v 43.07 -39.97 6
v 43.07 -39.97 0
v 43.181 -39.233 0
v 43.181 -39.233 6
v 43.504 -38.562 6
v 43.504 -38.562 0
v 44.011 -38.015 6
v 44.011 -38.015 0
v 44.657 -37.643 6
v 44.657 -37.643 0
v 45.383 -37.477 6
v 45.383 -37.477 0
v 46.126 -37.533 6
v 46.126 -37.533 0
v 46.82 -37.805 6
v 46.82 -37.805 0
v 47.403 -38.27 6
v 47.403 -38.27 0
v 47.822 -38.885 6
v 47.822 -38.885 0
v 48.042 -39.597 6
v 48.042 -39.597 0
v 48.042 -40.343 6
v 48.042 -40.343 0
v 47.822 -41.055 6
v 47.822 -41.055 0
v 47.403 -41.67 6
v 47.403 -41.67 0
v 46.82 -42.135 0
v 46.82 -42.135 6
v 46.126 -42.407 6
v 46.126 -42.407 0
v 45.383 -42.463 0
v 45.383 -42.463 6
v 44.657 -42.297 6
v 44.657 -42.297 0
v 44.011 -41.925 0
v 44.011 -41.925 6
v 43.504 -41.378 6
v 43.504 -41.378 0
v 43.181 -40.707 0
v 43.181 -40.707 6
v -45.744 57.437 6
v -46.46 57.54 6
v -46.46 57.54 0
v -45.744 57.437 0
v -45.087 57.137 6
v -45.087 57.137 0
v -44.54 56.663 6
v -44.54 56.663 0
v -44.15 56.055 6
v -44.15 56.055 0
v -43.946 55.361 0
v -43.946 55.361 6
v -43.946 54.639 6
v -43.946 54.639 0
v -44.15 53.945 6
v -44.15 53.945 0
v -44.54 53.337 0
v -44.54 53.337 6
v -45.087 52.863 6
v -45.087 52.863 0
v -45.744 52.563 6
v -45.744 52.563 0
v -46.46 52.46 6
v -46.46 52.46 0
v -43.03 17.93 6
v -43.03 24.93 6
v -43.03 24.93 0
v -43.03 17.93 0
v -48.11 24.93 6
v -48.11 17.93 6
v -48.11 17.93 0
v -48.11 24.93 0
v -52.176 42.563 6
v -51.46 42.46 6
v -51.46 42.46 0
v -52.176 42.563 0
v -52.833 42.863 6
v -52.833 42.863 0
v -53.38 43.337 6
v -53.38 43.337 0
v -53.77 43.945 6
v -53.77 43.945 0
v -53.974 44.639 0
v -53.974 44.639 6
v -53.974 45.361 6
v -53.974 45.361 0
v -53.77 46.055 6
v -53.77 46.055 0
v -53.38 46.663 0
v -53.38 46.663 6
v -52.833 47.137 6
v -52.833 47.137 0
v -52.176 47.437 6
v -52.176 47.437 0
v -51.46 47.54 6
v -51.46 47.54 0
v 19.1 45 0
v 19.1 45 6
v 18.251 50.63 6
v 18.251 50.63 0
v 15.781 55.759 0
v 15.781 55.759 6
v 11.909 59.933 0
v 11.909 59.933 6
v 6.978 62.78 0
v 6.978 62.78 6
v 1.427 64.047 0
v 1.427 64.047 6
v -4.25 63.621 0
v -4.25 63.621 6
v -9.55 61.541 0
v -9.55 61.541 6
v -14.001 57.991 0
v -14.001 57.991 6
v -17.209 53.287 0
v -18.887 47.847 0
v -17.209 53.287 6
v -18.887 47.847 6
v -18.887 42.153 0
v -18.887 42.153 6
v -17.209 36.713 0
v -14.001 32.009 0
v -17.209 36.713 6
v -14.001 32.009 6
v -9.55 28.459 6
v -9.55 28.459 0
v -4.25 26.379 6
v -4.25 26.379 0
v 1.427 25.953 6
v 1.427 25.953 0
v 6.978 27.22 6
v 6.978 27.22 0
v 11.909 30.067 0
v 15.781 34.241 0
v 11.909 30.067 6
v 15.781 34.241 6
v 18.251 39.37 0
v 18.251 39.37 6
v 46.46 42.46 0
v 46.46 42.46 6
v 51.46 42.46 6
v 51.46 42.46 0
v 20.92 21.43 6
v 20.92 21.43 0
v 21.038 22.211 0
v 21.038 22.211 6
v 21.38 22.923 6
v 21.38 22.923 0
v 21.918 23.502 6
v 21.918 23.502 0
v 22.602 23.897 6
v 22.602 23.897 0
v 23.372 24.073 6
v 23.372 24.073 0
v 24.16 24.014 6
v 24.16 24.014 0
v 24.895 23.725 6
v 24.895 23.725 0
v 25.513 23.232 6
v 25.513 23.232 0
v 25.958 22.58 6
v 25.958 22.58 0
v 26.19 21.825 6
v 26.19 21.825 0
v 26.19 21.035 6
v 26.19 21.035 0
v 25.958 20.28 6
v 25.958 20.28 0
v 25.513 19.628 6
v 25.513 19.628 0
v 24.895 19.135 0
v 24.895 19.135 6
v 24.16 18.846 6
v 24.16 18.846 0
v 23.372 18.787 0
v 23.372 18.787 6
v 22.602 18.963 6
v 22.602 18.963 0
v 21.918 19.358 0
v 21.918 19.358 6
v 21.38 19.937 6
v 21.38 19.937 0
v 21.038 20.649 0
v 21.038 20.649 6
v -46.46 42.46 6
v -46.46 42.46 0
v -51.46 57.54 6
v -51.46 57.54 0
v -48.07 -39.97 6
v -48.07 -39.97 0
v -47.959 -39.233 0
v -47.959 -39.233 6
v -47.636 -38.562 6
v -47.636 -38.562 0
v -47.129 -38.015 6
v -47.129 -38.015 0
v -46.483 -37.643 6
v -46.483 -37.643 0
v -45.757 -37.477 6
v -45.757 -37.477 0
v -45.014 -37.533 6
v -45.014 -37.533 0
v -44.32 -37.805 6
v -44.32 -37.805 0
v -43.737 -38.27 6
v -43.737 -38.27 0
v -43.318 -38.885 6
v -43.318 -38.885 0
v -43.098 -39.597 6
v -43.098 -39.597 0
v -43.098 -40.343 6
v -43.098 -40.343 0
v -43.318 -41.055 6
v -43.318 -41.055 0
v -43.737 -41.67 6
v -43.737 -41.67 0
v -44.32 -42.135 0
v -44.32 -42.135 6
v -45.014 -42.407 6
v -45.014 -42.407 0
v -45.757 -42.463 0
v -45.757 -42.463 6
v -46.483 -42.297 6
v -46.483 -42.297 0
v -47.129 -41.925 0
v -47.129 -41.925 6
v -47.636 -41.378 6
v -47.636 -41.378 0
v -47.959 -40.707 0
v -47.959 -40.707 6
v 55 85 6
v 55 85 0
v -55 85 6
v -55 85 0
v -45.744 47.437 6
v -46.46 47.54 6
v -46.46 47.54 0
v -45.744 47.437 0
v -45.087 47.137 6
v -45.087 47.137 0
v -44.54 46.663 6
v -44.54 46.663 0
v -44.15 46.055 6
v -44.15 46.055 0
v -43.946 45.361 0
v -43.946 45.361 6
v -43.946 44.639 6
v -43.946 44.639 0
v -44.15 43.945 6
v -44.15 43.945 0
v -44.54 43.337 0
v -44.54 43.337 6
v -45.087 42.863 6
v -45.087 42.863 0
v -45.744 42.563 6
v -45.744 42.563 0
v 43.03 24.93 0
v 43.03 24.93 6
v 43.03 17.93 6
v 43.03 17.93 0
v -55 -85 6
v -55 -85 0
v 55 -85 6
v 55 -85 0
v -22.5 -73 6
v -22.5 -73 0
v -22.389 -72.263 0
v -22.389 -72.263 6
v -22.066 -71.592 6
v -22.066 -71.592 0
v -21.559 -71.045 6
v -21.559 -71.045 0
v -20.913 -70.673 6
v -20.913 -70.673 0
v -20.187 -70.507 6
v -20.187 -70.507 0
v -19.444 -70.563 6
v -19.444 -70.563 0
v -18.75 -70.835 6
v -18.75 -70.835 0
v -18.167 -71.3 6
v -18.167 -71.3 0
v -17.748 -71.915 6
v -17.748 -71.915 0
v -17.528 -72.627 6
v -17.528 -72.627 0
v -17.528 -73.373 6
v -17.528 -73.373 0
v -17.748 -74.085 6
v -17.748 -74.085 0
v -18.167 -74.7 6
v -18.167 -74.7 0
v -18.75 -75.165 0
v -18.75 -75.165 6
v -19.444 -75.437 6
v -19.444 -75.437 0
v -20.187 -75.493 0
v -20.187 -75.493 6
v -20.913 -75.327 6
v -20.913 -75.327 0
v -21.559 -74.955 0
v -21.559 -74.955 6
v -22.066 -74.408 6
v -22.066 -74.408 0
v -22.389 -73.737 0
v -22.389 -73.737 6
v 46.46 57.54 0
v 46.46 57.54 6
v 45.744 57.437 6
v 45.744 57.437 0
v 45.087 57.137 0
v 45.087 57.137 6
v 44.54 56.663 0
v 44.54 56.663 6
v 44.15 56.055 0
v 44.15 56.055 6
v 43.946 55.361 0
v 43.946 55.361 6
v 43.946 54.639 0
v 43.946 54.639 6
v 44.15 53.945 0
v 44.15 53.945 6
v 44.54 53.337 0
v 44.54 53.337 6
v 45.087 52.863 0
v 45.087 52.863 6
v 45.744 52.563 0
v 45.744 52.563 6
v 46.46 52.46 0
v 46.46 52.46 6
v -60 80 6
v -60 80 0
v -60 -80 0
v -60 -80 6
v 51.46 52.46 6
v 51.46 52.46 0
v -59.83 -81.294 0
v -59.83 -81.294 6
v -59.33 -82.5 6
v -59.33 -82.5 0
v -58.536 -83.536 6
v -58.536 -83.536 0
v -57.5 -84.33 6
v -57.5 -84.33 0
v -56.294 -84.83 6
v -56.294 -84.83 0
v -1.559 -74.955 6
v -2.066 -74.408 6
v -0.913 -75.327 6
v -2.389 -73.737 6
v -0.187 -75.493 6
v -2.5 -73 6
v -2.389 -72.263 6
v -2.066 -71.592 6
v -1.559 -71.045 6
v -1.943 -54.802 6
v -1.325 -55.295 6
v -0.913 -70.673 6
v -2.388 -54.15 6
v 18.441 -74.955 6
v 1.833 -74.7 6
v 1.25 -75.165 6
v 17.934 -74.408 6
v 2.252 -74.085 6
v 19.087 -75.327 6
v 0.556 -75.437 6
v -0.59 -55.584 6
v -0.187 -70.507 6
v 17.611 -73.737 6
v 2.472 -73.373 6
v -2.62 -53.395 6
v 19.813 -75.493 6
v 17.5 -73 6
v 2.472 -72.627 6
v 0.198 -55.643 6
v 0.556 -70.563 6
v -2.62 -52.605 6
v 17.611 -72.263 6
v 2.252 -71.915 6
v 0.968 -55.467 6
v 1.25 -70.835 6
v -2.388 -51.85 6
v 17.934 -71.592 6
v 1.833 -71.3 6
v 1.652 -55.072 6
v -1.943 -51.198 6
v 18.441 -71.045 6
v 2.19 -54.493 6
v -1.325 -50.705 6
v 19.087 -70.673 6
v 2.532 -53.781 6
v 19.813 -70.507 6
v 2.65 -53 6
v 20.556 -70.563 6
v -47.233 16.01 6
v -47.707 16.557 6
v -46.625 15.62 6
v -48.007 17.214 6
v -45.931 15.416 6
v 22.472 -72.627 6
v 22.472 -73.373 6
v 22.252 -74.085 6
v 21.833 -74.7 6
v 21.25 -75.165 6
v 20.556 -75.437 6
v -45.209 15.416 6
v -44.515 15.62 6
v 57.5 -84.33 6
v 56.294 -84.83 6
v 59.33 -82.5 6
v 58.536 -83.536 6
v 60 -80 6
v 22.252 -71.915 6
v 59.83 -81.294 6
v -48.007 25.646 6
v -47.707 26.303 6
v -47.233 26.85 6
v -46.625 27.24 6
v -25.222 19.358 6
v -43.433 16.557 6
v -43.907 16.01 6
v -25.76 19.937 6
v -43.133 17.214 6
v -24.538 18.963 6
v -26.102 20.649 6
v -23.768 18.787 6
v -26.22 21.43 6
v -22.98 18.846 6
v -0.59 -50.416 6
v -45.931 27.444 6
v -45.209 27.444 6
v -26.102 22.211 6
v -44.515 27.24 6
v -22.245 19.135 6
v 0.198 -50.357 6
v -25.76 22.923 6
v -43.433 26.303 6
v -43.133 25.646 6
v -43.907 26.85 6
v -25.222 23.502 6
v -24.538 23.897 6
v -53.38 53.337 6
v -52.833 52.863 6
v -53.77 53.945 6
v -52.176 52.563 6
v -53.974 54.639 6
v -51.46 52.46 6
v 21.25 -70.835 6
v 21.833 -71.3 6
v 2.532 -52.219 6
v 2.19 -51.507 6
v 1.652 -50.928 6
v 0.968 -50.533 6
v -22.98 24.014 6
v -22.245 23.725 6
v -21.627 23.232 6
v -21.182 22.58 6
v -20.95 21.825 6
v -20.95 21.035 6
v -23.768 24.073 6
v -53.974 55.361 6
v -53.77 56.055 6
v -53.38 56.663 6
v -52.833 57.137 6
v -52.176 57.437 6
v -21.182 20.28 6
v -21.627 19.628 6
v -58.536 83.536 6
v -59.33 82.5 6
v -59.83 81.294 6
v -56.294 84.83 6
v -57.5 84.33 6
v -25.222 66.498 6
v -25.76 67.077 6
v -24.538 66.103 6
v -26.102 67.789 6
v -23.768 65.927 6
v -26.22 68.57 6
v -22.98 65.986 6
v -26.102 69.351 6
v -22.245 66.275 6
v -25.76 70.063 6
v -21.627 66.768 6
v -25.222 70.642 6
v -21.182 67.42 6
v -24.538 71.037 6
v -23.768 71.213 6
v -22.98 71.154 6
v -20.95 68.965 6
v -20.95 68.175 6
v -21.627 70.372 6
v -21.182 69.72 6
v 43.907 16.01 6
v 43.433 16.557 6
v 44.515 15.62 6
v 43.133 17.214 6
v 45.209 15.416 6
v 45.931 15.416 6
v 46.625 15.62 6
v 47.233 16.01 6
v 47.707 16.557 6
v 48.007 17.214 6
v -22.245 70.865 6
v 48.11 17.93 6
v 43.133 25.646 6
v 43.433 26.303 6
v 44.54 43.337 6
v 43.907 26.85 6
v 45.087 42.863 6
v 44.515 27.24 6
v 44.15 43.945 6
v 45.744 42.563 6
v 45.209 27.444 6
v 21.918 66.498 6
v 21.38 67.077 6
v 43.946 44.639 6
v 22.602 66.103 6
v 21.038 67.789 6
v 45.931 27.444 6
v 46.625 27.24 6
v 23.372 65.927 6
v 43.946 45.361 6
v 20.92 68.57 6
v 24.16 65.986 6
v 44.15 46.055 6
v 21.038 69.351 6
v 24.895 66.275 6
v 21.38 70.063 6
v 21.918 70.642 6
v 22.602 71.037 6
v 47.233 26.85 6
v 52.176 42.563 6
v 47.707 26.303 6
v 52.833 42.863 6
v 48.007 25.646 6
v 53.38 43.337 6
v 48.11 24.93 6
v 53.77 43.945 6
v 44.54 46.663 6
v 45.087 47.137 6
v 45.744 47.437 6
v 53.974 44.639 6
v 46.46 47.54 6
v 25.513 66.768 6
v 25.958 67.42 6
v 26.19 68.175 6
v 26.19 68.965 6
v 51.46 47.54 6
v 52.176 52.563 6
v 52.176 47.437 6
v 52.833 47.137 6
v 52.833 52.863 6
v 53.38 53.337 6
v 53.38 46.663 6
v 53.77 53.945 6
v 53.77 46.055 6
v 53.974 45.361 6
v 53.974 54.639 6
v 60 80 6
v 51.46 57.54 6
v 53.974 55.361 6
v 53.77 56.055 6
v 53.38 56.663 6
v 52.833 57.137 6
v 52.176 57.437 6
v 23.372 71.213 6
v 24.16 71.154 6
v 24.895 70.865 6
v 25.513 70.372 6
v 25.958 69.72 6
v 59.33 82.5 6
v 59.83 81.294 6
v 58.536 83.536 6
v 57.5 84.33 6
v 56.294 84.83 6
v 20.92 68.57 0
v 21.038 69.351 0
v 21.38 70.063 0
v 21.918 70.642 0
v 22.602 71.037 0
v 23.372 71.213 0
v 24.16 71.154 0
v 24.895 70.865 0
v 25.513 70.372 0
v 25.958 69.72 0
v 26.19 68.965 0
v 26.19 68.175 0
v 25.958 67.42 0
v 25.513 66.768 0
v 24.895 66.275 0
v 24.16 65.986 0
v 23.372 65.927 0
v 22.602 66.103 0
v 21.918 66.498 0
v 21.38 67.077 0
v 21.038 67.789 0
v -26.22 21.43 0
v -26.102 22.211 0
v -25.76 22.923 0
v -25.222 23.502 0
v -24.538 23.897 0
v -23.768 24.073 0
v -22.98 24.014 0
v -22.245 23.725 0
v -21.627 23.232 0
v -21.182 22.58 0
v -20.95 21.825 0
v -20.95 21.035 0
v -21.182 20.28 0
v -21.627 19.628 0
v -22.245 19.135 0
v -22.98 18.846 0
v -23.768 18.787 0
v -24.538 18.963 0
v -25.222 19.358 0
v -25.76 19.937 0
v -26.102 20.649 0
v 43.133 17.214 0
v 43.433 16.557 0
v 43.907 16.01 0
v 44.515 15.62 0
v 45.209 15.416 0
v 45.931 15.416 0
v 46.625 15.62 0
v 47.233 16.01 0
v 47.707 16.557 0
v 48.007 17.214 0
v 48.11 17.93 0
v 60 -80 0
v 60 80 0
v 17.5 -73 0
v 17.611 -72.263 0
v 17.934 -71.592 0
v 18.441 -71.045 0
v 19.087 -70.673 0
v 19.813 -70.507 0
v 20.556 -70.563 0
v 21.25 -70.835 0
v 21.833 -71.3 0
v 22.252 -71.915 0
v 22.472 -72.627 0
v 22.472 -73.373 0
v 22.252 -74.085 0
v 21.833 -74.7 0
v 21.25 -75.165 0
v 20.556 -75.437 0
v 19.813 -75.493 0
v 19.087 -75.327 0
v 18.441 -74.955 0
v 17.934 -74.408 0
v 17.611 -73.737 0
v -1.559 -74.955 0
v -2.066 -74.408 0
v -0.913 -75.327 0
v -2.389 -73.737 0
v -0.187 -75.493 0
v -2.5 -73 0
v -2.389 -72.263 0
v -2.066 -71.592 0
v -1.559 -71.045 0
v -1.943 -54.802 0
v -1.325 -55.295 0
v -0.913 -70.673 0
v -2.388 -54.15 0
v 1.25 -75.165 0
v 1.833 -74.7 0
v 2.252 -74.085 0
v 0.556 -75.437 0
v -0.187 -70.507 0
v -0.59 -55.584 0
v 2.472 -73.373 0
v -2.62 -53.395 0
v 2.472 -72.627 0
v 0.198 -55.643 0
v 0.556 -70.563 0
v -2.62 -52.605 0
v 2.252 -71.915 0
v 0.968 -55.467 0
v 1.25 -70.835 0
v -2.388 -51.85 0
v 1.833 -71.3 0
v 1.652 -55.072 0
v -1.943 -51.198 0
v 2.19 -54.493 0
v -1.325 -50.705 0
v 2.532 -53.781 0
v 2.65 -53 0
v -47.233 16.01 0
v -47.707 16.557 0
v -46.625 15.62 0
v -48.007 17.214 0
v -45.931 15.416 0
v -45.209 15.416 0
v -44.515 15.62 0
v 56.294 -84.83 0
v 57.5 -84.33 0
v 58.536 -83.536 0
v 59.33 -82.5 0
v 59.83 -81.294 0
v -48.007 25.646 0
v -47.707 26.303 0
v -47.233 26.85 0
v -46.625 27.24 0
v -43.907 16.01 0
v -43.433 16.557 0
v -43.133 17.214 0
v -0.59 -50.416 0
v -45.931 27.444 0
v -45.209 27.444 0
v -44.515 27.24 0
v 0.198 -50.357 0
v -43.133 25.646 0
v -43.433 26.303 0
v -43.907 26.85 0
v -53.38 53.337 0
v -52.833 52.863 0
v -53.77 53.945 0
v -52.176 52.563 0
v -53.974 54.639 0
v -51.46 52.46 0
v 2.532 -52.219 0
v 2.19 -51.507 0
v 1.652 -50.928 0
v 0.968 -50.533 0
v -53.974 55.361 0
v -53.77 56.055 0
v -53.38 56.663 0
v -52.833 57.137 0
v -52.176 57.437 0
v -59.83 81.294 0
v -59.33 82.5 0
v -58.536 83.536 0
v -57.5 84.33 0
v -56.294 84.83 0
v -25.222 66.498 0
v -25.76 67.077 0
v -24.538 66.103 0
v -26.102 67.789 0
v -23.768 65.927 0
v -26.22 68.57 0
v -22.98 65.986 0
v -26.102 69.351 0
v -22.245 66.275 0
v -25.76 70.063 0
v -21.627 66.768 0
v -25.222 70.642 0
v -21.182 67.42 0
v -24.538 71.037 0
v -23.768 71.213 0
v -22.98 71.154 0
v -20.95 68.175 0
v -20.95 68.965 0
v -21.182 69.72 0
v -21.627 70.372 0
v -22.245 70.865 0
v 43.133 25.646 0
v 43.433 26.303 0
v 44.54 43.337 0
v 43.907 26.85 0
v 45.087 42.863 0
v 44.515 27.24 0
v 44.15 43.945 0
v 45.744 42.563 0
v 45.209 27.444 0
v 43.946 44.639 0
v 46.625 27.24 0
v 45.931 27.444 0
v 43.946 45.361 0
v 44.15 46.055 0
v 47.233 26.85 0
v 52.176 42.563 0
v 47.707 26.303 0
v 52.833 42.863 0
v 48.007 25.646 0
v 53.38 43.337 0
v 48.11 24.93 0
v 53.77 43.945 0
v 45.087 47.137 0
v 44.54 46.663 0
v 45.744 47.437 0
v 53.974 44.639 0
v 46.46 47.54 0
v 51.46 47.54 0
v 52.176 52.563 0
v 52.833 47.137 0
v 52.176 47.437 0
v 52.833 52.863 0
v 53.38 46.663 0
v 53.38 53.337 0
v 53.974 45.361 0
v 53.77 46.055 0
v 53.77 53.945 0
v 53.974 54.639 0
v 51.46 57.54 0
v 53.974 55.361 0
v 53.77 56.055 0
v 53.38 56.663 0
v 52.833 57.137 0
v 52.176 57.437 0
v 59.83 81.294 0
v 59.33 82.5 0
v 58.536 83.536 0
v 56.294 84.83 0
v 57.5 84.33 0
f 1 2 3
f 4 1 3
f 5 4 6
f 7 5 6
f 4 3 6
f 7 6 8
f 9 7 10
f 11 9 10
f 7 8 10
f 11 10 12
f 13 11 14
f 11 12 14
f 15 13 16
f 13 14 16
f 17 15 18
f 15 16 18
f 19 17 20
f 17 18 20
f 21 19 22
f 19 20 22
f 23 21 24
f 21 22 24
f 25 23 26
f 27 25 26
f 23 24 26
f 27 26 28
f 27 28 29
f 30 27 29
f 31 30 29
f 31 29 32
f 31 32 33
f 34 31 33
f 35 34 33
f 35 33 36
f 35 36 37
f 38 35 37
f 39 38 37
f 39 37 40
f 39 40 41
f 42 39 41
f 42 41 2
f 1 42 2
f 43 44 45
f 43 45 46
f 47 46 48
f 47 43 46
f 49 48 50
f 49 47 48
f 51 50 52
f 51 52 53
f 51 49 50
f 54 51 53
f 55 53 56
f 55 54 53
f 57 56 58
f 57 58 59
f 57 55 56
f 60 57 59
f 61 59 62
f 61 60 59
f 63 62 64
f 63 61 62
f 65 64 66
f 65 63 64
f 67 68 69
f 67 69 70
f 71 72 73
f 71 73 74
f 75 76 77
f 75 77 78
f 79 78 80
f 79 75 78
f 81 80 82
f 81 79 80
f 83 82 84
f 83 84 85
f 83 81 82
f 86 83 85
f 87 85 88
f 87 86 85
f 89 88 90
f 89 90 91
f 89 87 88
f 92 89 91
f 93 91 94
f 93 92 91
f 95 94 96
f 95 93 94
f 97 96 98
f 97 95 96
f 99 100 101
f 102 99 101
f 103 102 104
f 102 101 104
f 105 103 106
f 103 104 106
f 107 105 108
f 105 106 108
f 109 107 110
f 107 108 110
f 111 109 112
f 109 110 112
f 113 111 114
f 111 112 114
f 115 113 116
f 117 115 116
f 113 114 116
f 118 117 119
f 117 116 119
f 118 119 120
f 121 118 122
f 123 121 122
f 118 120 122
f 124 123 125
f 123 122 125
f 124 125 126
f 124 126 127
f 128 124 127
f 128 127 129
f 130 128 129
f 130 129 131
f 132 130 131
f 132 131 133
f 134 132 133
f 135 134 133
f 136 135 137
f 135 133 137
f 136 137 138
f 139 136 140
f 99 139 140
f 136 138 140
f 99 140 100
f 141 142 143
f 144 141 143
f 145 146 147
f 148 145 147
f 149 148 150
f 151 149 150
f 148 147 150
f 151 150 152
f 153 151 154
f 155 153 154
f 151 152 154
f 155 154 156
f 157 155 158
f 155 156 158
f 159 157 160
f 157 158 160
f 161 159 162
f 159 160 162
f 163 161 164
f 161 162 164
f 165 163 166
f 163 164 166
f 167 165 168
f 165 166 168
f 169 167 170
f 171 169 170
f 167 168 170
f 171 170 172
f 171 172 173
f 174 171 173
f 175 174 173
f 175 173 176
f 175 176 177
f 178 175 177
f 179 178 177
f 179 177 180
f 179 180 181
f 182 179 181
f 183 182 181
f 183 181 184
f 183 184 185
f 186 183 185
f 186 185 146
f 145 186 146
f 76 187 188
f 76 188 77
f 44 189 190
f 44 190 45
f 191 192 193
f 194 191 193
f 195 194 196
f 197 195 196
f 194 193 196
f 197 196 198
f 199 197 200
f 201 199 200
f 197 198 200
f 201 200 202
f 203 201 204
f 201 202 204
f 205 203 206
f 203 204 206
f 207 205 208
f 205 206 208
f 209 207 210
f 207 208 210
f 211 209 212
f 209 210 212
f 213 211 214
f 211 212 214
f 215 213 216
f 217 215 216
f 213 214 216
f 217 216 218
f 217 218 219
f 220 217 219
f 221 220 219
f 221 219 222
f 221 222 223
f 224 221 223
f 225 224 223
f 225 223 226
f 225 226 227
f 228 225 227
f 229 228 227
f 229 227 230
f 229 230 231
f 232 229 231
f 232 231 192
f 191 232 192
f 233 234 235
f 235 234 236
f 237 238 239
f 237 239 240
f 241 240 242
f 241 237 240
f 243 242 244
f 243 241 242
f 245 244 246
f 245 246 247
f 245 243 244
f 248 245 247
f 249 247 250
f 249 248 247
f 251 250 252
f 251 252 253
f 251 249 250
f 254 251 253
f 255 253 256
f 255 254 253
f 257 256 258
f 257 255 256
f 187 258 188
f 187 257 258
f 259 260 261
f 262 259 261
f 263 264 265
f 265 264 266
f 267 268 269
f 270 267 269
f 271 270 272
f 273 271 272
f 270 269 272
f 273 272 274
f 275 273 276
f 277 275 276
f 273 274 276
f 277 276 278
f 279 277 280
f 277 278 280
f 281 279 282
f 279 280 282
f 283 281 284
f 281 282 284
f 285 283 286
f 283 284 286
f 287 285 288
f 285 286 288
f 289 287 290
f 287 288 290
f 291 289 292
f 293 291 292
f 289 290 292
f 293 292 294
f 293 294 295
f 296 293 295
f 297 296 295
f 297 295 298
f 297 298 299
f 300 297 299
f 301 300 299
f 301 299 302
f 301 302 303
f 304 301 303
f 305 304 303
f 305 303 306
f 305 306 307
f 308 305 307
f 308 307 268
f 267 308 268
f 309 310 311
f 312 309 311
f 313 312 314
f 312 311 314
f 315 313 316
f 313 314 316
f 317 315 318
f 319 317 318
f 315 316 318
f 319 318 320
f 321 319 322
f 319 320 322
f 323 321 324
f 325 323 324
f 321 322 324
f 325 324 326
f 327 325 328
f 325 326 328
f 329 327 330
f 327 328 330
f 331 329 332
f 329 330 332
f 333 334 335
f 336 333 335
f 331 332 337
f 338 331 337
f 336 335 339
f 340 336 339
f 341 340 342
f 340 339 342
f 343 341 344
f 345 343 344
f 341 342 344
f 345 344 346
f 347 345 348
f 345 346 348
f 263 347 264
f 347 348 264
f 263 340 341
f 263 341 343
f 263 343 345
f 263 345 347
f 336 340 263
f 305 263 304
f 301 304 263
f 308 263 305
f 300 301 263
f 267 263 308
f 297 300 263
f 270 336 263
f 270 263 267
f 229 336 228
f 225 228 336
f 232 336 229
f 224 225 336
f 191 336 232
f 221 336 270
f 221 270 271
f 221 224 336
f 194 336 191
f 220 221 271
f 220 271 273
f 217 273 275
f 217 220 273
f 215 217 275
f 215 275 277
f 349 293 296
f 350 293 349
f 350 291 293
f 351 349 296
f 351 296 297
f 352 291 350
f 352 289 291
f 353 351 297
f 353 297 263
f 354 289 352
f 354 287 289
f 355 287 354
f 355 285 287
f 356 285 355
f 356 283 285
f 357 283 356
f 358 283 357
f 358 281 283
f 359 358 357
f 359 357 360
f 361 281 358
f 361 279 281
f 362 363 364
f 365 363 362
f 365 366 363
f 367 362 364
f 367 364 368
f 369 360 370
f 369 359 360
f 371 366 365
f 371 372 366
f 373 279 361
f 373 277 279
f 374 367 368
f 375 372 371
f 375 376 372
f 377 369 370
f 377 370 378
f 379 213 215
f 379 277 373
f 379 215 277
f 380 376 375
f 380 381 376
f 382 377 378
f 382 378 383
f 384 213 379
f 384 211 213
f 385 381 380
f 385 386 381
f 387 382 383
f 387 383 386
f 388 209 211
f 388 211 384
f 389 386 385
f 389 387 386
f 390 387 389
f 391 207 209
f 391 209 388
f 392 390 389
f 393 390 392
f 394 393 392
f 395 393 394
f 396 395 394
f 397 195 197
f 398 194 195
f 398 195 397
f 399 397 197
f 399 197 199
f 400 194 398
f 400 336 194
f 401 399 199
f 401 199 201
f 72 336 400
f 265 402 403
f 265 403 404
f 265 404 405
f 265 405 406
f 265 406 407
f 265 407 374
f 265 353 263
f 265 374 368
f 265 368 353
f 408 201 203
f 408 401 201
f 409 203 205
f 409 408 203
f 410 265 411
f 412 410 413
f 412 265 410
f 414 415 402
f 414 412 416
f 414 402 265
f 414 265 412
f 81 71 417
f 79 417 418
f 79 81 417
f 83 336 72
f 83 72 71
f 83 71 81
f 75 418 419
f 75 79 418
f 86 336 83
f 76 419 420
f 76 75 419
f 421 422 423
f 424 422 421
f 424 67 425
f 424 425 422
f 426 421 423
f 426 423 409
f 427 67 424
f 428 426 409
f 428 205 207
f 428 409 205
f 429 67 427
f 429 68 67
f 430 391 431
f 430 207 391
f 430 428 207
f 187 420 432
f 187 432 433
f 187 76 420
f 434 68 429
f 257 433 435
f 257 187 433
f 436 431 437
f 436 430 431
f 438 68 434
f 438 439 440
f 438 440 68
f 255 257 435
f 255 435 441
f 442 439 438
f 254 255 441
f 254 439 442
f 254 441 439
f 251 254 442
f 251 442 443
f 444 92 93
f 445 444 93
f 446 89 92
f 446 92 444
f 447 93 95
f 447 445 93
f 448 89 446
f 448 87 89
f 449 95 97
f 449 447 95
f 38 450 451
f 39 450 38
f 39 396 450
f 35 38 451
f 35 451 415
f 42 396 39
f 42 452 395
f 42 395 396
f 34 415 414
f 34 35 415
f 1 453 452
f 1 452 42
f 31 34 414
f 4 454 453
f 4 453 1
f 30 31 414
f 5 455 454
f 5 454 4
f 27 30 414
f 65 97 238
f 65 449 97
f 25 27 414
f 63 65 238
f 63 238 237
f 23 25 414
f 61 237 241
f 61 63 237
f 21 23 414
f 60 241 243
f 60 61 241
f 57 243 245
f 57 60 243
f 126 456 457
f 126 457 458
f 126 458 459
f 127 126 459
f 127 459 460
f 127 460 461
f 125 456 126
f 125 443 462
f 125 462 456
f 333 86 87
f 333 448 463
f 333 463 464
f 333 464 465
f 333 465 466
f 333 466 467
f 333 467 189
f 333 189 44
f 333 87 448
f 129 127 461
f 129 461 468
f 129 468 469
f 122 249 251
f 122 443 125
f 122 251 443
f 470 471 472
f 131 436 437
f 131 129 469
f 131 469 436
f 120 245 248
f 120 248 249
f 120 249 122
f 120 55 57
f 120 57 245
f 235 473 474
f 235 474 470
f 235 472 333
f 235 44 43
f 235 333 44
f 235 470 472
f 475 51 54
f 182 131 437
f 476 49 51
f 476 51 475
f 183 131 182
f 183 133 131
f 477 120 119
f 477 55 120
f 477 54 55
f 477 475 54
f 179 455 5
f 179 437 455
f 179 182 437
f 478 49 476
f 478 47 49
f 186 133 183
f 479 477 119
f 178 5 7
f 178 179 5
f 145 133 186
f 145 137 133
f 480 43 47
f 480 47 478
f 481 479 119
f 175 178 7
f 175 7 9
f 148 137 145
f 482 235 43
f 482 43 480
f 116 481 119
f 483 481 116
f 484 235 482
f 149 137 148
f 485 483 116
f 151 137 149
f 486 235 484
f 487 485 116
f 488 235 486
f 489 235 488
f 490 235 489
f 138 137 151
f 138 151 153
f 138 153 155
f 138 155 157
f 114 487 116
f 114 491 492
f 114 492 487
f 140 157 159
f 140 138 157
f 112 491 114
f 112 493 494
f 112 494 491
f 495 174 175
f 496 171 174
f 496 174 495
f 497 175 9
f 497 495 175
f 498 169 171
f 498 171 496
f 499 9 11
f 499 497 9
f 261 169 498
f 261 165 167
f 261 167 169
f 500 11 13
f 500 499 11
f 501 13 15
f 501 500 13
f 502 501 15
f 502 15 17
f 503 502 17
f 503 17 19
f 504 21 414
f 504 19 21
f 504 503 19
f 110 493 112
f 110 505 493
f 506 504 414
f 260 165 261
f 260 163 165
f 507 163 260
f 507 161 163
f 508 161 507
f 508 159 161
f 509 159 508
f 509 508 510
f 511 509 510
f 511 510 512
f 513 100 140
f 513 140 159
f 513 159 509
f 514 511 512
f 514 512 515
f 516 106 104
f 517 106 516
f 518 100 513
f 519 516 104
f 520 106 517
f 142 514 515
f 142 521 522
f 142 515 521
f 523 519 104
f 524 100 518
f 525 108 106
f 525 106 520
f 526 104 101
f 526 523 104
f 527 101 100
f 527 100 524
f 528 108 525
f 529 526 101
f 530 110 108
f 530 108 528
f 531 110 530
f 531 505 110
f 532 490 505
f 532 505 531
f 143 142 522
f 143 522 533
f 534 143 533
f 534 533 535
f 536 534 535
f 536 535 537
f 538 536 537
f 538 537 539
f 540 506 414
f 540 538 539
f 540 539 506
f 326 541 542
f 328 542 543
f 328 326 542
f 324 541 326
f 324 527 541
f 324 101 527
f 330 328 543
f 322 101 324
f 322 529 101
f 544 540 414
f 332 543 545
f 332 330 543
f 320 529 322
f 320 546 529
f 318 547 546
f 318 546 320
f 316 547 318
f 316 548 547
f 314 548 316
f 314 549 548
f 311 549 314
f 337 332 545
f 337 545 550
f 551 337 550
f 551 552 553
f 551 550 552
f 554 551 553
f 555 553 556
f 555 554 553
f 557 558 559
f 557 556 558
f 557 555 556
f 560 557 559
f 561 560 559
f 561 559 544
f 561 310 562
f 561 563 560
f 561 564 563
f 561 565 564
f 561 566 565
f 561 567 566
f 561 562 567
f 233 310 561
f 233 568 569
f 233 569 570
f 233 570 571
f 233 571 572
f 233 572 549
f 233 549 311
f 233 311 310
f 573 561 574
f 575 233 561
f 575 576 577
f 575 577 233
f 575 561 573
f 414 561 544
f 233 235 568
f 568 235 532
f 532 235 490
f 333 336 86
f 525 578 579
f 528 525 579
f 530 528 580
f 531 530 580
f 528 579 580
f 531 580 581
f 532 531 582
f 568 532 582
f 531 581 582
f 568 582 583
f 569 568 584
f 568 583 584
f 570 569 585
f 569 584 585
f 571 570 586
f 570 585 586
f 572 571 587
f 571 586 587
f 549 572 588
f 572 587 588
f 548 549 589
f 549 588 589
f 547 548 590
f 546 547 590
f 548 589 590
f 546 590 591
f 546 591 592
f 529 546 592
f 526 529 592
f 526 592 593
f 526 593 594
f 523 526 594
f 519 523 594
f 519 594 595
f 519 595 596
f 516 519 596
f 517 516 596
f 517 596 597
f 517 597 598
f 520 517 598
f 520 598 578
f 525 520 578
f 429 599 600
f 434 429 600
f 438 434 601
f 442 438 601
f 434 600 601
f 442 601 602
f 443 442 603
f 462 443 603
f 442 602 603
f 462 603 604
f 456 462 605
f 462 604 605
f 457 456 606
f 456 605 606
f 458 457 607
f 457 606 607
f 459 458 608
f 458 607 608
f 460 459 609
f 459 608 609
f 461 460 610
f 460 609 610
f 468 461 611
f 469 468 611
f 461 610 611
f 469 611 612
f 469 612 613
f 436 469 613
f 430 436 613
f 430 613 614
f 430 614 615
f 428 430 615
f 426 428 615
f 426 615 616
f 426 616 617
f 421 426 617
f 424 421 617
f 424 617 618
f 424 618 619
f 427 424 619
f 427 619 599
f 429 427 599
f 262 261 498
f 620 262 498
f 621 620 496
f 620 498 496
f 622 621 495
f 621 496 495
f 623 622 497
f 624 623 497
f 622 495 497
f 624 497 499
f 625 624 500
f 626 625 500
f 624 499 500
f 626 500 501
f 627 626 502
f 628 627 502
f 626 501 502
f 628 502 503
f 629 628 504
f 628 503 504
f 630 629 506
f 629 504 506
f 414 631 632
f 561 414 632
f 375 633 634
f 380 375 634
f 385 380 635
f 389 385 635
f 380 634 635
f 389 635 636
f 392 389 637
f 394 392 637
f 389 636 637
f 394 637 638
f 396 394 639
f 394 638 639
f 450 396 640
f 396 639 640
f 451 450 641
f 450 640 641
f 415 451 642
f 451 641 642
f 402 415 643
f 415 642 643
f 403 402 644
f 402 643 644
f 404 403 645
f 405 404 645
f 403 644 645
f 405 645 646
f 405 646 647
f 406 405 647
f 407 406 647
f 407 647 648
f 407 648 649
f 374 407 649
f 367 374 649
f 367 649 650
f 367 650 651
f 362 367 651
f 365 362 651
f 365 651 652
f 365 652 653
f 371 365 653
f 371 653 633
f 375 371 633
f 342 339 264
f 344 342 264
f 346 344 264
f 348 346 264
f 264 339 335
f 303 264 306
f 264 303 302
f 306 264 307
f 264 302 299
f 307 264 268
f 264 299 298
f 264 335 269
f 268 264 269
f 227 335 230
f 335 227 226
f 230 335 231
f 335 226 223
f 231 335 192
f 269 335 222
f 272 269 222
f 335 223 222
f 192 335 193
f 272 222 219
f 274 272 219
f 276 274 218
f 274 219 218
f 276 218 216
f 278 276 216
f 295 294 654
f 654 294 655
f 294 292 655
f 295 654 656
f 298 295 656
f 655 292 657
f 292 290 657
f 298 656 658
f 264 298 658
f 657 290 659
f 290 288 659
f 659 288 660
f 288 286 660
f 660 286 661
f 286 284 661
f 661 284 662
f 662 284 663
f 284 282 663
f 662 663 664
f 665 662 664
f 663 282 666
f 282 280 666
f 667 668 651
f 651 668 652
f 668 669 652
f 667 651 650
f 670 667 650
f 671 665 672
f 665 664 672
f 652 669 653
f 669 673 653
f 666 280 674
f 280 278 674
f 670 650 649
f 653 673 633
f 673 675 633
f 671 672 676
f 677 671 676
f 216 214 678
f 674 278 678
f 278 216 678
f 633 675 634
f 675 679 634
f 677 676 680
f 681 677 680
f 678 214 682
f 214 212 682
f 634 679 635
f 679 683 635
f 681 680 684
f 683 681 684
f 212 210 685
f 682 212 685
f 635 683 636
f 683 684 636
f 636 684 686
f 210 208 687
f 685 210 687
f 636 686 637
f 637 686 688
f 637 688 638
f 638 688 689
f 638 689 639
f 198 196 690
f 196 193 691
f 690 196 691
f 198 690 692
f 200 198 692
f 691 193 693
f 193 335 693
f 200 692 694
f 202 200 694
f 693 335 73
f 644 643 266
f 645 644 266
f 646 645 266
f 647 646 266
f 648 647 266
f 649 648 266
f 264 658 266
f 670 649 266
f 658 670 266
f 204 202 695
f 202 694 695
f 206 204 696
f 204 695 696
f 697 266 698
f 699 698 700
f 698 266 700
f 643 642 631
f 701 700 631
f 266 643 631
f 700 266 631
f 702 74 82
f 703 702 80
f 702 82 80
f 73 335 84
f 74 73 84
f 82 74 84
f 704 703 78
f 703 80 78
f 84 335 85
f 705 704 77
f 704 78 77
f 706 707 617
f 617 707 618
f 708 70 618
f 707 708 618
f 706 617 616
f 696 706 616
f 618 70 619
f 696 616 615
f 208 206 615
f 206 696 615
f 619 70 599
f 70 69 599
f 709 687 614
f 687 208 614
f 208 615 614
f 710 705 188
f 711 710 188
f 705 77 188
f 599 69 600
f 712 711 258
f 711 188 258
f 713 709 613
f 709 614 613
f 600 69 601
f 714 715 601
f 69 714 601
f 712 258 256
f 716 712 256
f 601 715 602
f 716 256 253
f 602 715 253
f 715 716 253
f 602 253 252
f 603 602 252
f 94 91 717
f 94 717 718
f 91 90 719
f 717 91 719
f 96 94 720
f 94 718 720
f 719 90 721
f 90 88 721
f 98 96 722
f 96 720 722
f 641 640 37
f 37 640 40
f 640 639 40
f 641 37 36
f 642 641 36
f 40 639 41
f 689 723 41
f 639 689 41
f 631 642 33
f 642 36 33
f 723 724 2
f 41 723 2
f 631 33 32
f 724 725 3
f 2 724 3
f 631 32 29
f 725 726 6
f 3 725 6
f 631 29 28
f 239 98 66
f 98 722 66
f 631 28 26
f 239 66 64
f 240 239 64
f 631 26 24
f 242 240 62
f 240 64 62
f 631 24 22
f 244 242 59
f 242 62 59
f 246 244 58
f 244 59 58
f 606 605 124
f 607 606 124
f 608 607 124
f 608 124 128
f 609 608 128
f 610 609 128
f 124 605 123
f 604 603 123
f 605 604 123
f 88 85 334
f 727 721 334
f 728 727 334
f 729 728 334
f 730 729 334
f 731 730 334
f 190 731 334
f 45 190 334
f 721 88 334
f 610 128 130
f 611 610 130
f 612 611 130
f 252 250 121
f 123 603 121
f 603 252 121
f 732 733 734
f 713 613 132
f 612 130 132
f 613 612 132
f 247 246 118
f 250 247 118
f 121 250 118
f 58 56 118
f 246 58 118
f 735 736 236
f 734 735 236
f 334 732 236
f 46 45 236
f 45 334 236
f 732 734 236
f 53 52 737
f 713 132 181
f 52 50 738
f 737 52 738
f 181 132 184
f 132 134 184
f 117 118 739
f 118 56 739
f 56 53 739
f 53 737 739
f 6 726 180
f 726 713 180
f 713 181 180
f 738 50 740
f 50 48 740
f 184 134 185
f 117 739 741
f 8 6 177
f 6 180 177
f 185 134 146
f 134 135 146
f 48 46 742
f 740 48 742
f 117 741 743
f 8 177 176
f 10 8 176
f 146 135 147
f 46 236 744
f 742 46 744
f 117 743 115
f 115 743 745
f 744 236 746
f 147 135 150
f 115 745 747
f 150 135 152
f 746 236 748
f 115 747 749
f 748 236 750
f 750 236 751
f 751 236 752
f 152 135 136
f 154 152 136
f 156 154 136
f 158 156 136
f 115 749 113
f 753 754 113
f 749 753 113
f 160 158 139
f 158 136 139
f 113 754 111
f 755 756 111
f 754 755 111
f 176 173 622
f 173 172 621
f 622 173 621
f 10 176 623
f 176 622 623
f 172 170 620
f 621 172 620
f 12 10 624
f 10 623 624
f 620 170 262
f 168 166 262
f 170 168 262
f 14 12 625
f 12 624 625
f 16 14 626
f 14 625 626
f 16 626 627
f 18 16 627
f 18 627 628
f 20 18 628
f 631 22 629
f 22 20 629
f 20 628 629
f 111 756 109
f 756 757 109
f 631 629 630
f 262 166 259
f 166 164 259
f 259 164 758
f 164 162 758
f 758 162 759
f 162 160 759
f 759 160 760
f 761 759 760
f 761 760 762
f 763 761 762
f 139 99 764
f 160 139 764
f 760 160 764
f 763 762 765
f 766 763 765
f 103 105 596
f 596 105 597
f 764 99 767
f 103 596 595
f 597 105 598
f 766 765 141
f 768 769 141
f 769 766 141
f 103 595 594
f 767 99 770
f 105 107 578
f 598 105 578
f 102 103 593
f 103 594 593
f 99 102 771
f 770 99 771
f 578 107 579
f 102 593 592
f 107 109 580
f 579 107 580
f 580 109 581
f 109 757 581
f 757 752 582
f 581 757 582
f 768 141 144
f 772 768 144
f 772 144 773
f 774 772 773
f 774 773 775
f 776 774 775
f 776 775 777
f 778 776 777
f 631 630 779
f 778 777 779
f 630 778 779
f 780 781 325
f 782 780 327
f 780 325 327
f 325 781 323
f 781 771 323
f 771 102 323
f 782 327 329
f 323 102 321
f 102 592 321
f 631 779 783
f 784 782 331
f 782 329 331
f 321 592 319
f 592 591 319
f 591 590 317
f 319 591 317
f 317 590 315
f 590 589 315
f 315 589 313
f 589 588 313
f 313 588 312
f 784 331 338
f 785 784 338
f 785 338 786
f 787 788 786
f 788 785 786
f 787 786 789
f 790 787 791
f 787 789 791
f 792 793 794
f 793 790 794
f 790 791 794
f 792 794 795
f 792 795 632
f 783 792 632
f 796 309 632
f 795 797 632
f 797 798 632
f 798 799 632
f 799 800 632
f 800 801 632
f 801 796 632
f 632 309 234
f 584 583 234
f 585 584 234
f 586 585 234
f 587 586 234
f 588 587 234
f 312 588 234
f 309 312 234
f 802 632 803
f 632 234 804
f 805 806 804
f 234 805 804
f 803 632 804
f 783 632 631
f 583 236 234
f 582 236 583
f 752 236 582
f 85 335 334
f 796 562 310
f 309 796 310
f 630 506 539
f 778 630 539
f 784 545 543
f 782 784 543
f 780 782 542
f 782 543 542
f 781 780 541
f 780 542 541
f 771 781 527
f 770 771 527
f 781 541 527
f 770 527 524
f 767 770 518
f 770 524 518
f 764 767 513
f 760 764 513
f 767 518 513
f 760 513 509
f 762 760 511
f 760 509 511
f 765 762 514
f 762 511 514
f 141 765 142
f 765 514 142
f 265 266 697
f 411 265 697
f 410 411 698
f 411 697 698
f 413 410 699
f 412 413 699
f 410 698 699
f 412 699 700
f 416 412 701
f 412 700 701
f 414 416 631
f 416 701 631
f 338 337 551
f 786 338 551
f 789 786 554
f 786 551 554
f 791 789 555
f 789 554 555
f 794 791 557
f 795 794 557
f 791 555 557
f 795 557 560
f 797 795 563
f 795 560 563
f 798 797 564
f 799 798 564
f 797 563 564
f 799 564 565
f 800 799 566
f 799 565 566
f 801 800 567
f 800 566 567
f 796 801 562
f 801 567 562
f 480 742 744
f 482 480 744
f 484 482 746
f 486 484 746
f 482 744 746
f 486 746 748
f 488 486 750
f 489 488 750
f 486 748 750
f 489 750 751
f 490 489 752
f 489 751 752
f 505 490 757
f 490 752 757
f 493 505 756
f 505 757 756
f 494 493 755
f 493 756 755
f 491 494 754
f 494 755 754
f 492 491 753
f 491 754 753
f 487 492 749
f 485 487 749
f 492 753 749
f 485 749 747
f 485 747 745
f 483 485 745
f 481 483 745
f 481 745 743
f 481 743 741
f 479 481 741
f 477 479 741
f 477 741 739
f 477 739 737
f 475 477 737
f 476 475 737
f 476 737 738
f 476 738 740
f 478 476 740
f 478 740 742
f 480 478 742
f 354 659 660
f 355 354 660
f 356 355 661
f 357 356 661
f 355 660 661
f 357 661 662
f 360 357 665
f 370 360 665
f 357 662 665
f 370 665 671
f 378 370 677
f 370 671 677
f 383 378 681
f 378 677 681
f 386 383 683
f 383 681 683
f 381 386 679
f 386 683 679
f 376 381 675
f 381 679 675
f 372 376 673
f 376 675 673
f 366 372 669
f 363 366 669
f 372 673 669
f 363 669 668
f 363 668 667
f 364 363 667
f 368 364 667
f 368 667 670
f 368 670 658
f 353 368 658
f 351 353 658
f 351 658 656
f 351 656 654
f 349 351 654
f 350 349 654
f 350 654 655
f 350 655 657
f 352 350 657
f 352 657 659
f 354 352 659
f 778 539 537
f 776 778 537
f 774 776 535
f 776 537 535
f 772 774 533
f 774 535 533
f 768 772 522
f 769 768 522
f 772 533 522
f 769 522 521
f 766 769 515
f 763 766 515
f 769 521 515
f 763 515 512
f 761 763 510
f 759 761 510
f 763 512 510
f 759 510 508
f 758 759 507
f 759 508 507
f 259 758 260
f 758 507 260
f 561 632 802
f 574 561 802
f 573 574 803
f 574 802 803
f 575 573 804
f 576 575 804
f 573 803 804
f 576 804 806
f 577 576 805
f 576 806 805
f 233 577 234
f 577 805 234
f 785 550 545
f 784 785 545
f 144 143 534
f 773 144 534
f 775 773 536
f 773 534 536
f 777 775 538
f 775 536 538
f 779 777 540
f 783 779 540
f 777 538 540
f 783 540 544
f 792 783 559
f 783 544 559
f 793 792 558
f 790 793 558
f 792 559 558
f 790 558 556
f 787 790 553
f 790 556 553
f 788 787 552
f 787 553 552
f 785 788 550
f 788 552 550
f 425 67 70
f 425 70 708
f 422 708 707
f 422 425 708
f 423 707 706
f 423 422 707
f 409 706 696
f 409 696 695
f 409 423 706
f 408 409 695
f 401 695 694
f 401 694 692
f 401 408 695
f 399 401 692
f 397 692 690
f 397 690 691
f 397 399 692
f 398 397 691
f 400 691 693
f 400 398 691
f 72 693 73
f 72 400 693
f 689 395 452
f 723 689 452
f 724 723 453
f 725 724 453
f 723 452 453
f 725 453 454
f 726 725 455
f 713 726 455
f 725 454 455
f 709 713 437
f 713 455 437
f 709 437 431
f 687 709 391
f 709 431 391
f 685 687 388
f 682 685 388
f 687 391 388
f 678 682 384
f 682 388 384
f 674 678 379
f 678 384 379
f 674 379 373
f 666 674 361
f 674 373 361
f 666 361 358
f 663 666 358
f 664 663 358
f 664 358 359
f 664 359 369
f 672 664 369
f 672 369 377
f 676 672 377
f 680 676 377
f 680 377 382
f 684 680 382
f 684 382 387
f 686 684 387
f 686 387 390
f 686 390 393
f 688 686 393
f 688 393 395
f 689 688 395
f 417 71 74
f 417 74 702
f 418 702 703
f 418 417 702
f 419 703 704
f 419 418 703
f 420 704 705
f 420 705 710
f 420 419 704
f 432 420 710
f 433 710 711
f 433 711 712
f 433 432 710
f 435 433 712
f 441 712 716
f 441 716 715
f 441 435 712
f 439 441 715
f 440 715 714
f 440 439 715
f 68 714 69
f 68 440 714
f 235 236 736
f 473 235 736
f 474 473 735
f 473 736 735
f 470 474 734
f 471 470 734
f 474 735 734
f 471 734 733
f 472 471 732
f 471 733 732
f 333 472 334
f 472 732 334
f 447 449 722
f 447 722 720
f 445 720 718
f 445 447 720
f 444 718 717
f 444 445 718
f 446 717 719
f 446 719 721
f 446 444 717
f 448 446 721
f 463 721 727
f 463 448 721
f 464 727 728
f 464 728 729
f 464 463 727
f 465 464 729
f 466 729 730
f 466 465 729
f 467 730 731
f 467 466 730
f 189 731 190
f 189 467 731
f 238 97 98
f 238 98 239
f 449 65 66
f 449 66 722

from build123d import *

# Parameters (mm, degrees)
BOSS_EXTRUDE1_DEPTH      = 6
SKETCH3_R                = 19.1
CUT_EXTRUDE1_DEPTH       = 6
M5_CLEARANCE_HOLE1_D     = 5.3
CUT_EXTRUDE2_DEPTH       = 6
CUT_EXTRUDE4_DEPTH       = 6
F_5_0_5_DIAMETER_HOLE4_D = 5
M5_CLEARANCE_HOLE2_D     = 5.3
M5_CLEARANCE_HOLE2_DEPTH = 10
M5_CLEARANCE_HOLE2_TIP   = 1.59228064


with BuildPart() as part:
    # Sketch1 → Boss-Extrude1 (new body)
    with BuildSketch(Plane.XY):
        with BuildLine():
            Line((-55, -85), (55, -85))
            ThreePointArc((55, -85), (58.535533906, -83.535533906), (60, -80))
            Line((60, -80), (60, 80))
            ThreePointArc((60, 80), (58.535533906, 83.535533906), (55, 85))
            Line((55, 85), (-55, 85))
            ThreePointArc((-55, 85), (-58.535533906, 83.535533906), (-60, 80))
            Line((-60, 80), (-60, -80))
            ThreePointArc((-60, -80), (-58.535533906, -83.535533906), (-55, -85))
        make_face()
    extrude(amount=BOSS_EXTRUDE1_DEPTH)

    # Sketch3 → Cut-Extrude1 (cut)
    with BuildSketch(Plane.XY.offset(6)):
        with Locations((0, 45)):
            Circle(SKETCH3_R)
    extrude(amount=-CUT_EXTRUDE1_DEPTH, mode=Mode.SUBTRACT)

    # M5 Clearance Hole1 (through all)
    with Locations(Plane.XY.offset(6)):
        with Locations((-23.57, 68.57), (23.57, 68.57), (23.57, 21.43), (-23.57, 21.43)):
            Hole(M5_CLEARANCE_HOLE1_D / 2)

    # Sketch11 → Cut-Extrude2 (cut)
    with BuildSketch(Plane.XY.offset(6)):
        with BuildLine():
            Line((-43.03, 24.93), (-43.03, 17.93))
            ThreePointArc((-43.03, 17.93), (-45.57, 15.39), (-48.11, 17.93))
            Line((-48.11, 17.93), (-48.11, 24.93))
            ThreePointArc((-48.11, 24.93), (-45.57, 27.47), (-43.03, 24.93))
        make_face()
        with BuildLine():
            Line((43.03, 24.93), (43.03, 17.93))
            ThreePointArc((43.03, 17.93), (45.57, 15.39), (48.11, 17.93))
            Line((48.11, 17.93), (48.11, 24.93))
            ThreePointArc((48.11, 24.93), (45.57, 27.47), (43.03, 24.93))
        make_face()
    extrude(amount=-CUT_EXTRUDE2_DEPTH, mode=Mode.SUBTRACT)

    # Sketch15 → Cut-Extrude4 (cut)
    with BuildSketch(Plane.XY.offset(6)):
        with BuildLine():
            Line((-51.46, 47.54), (-46.46, 47.54))
            ThreePointArc((-46.46, 47.54), (-43.92, 45), (-46.46, 42.46))
            Line((-46.46, 42.46), (-51.46, 42.46))
            ThreePointArc((-51.46, 42.46), (-54, 45), (-51.46, 47.54))
        make_face()
        with BuildLine():
            Line((-51.46, 57.54), (-46.46, 57.54))
            ThreePointArc((-46.46, 57.54), (-43.92, 55), (-46.46, 52.46))
            Line((-46.46, 52.46), (-51.46, 52.46))
            ThreePointArc((-51.46, 52.46), (-54, 55), (-51.46, 57.54))
        make_face()
        with BuildLine():
            Line((51.46, 47.54), (46.46, 47.54))
            ThreePointArc((46.46, 47.54), (43.92, 45), (46.46, 42.46))
            Line((46.46, 42.46), (51.46, 42.46))
            ThreePointArc((51.46, 42.46), (54, 45), (51.46, 47.54))
        make_face()
        with BuildLine():
            Line((51.46, 57.54), (46.46, 57.54))
            ThreePointArc((46.46, 57.54), (43.92, 55), (46.46, 52.46))
            Line((46.46, 52.46), (51.46, 52.46))
            ThreePointArc((51.46, 52.46), (54, 55), (51.46, 57.54))
        make_face()
    extrude(amount=-CUT_EXTRUDE4_DEPTH, mode=Mode.SUBTRACT)

    # Ø5.0 (5) Diameter Hole4 (through all)
    with Locations(Plane.XY.offset(6)):
        with Locations((-45.57, -39.97), (45.57, -39.97), (20, -73), (0, -73), (-20, -73)):
            Hole(F_5_0_5_DIAMETER_HOLE4_D / 2)

    # M5 Clearance Hole2
    with Locations(Plane(origin=(0, 0, 0), x_dir=(-1, 0, 0), z_dir=(0, 0, -1))):
        with Locations((0, -53)):
            Hole(M5_CLEARANCE_HOLE2_D / 2, depth=M5_CLEARANCE_HOLE2_DEPTH)
            with Locations((0, 0, -(M5_CLEARANCE_HOLE2_DEPTH + M5_CLEARANCE_HOLE2_TIP / 2))):  # 118° drill point
                Cone(0, M5_CLEARANCE_HOLE2_D / 2, M5_CLEARANCE_HOLE2_TIP, mode=Mode.SUBTRACT)


solid = part.part
